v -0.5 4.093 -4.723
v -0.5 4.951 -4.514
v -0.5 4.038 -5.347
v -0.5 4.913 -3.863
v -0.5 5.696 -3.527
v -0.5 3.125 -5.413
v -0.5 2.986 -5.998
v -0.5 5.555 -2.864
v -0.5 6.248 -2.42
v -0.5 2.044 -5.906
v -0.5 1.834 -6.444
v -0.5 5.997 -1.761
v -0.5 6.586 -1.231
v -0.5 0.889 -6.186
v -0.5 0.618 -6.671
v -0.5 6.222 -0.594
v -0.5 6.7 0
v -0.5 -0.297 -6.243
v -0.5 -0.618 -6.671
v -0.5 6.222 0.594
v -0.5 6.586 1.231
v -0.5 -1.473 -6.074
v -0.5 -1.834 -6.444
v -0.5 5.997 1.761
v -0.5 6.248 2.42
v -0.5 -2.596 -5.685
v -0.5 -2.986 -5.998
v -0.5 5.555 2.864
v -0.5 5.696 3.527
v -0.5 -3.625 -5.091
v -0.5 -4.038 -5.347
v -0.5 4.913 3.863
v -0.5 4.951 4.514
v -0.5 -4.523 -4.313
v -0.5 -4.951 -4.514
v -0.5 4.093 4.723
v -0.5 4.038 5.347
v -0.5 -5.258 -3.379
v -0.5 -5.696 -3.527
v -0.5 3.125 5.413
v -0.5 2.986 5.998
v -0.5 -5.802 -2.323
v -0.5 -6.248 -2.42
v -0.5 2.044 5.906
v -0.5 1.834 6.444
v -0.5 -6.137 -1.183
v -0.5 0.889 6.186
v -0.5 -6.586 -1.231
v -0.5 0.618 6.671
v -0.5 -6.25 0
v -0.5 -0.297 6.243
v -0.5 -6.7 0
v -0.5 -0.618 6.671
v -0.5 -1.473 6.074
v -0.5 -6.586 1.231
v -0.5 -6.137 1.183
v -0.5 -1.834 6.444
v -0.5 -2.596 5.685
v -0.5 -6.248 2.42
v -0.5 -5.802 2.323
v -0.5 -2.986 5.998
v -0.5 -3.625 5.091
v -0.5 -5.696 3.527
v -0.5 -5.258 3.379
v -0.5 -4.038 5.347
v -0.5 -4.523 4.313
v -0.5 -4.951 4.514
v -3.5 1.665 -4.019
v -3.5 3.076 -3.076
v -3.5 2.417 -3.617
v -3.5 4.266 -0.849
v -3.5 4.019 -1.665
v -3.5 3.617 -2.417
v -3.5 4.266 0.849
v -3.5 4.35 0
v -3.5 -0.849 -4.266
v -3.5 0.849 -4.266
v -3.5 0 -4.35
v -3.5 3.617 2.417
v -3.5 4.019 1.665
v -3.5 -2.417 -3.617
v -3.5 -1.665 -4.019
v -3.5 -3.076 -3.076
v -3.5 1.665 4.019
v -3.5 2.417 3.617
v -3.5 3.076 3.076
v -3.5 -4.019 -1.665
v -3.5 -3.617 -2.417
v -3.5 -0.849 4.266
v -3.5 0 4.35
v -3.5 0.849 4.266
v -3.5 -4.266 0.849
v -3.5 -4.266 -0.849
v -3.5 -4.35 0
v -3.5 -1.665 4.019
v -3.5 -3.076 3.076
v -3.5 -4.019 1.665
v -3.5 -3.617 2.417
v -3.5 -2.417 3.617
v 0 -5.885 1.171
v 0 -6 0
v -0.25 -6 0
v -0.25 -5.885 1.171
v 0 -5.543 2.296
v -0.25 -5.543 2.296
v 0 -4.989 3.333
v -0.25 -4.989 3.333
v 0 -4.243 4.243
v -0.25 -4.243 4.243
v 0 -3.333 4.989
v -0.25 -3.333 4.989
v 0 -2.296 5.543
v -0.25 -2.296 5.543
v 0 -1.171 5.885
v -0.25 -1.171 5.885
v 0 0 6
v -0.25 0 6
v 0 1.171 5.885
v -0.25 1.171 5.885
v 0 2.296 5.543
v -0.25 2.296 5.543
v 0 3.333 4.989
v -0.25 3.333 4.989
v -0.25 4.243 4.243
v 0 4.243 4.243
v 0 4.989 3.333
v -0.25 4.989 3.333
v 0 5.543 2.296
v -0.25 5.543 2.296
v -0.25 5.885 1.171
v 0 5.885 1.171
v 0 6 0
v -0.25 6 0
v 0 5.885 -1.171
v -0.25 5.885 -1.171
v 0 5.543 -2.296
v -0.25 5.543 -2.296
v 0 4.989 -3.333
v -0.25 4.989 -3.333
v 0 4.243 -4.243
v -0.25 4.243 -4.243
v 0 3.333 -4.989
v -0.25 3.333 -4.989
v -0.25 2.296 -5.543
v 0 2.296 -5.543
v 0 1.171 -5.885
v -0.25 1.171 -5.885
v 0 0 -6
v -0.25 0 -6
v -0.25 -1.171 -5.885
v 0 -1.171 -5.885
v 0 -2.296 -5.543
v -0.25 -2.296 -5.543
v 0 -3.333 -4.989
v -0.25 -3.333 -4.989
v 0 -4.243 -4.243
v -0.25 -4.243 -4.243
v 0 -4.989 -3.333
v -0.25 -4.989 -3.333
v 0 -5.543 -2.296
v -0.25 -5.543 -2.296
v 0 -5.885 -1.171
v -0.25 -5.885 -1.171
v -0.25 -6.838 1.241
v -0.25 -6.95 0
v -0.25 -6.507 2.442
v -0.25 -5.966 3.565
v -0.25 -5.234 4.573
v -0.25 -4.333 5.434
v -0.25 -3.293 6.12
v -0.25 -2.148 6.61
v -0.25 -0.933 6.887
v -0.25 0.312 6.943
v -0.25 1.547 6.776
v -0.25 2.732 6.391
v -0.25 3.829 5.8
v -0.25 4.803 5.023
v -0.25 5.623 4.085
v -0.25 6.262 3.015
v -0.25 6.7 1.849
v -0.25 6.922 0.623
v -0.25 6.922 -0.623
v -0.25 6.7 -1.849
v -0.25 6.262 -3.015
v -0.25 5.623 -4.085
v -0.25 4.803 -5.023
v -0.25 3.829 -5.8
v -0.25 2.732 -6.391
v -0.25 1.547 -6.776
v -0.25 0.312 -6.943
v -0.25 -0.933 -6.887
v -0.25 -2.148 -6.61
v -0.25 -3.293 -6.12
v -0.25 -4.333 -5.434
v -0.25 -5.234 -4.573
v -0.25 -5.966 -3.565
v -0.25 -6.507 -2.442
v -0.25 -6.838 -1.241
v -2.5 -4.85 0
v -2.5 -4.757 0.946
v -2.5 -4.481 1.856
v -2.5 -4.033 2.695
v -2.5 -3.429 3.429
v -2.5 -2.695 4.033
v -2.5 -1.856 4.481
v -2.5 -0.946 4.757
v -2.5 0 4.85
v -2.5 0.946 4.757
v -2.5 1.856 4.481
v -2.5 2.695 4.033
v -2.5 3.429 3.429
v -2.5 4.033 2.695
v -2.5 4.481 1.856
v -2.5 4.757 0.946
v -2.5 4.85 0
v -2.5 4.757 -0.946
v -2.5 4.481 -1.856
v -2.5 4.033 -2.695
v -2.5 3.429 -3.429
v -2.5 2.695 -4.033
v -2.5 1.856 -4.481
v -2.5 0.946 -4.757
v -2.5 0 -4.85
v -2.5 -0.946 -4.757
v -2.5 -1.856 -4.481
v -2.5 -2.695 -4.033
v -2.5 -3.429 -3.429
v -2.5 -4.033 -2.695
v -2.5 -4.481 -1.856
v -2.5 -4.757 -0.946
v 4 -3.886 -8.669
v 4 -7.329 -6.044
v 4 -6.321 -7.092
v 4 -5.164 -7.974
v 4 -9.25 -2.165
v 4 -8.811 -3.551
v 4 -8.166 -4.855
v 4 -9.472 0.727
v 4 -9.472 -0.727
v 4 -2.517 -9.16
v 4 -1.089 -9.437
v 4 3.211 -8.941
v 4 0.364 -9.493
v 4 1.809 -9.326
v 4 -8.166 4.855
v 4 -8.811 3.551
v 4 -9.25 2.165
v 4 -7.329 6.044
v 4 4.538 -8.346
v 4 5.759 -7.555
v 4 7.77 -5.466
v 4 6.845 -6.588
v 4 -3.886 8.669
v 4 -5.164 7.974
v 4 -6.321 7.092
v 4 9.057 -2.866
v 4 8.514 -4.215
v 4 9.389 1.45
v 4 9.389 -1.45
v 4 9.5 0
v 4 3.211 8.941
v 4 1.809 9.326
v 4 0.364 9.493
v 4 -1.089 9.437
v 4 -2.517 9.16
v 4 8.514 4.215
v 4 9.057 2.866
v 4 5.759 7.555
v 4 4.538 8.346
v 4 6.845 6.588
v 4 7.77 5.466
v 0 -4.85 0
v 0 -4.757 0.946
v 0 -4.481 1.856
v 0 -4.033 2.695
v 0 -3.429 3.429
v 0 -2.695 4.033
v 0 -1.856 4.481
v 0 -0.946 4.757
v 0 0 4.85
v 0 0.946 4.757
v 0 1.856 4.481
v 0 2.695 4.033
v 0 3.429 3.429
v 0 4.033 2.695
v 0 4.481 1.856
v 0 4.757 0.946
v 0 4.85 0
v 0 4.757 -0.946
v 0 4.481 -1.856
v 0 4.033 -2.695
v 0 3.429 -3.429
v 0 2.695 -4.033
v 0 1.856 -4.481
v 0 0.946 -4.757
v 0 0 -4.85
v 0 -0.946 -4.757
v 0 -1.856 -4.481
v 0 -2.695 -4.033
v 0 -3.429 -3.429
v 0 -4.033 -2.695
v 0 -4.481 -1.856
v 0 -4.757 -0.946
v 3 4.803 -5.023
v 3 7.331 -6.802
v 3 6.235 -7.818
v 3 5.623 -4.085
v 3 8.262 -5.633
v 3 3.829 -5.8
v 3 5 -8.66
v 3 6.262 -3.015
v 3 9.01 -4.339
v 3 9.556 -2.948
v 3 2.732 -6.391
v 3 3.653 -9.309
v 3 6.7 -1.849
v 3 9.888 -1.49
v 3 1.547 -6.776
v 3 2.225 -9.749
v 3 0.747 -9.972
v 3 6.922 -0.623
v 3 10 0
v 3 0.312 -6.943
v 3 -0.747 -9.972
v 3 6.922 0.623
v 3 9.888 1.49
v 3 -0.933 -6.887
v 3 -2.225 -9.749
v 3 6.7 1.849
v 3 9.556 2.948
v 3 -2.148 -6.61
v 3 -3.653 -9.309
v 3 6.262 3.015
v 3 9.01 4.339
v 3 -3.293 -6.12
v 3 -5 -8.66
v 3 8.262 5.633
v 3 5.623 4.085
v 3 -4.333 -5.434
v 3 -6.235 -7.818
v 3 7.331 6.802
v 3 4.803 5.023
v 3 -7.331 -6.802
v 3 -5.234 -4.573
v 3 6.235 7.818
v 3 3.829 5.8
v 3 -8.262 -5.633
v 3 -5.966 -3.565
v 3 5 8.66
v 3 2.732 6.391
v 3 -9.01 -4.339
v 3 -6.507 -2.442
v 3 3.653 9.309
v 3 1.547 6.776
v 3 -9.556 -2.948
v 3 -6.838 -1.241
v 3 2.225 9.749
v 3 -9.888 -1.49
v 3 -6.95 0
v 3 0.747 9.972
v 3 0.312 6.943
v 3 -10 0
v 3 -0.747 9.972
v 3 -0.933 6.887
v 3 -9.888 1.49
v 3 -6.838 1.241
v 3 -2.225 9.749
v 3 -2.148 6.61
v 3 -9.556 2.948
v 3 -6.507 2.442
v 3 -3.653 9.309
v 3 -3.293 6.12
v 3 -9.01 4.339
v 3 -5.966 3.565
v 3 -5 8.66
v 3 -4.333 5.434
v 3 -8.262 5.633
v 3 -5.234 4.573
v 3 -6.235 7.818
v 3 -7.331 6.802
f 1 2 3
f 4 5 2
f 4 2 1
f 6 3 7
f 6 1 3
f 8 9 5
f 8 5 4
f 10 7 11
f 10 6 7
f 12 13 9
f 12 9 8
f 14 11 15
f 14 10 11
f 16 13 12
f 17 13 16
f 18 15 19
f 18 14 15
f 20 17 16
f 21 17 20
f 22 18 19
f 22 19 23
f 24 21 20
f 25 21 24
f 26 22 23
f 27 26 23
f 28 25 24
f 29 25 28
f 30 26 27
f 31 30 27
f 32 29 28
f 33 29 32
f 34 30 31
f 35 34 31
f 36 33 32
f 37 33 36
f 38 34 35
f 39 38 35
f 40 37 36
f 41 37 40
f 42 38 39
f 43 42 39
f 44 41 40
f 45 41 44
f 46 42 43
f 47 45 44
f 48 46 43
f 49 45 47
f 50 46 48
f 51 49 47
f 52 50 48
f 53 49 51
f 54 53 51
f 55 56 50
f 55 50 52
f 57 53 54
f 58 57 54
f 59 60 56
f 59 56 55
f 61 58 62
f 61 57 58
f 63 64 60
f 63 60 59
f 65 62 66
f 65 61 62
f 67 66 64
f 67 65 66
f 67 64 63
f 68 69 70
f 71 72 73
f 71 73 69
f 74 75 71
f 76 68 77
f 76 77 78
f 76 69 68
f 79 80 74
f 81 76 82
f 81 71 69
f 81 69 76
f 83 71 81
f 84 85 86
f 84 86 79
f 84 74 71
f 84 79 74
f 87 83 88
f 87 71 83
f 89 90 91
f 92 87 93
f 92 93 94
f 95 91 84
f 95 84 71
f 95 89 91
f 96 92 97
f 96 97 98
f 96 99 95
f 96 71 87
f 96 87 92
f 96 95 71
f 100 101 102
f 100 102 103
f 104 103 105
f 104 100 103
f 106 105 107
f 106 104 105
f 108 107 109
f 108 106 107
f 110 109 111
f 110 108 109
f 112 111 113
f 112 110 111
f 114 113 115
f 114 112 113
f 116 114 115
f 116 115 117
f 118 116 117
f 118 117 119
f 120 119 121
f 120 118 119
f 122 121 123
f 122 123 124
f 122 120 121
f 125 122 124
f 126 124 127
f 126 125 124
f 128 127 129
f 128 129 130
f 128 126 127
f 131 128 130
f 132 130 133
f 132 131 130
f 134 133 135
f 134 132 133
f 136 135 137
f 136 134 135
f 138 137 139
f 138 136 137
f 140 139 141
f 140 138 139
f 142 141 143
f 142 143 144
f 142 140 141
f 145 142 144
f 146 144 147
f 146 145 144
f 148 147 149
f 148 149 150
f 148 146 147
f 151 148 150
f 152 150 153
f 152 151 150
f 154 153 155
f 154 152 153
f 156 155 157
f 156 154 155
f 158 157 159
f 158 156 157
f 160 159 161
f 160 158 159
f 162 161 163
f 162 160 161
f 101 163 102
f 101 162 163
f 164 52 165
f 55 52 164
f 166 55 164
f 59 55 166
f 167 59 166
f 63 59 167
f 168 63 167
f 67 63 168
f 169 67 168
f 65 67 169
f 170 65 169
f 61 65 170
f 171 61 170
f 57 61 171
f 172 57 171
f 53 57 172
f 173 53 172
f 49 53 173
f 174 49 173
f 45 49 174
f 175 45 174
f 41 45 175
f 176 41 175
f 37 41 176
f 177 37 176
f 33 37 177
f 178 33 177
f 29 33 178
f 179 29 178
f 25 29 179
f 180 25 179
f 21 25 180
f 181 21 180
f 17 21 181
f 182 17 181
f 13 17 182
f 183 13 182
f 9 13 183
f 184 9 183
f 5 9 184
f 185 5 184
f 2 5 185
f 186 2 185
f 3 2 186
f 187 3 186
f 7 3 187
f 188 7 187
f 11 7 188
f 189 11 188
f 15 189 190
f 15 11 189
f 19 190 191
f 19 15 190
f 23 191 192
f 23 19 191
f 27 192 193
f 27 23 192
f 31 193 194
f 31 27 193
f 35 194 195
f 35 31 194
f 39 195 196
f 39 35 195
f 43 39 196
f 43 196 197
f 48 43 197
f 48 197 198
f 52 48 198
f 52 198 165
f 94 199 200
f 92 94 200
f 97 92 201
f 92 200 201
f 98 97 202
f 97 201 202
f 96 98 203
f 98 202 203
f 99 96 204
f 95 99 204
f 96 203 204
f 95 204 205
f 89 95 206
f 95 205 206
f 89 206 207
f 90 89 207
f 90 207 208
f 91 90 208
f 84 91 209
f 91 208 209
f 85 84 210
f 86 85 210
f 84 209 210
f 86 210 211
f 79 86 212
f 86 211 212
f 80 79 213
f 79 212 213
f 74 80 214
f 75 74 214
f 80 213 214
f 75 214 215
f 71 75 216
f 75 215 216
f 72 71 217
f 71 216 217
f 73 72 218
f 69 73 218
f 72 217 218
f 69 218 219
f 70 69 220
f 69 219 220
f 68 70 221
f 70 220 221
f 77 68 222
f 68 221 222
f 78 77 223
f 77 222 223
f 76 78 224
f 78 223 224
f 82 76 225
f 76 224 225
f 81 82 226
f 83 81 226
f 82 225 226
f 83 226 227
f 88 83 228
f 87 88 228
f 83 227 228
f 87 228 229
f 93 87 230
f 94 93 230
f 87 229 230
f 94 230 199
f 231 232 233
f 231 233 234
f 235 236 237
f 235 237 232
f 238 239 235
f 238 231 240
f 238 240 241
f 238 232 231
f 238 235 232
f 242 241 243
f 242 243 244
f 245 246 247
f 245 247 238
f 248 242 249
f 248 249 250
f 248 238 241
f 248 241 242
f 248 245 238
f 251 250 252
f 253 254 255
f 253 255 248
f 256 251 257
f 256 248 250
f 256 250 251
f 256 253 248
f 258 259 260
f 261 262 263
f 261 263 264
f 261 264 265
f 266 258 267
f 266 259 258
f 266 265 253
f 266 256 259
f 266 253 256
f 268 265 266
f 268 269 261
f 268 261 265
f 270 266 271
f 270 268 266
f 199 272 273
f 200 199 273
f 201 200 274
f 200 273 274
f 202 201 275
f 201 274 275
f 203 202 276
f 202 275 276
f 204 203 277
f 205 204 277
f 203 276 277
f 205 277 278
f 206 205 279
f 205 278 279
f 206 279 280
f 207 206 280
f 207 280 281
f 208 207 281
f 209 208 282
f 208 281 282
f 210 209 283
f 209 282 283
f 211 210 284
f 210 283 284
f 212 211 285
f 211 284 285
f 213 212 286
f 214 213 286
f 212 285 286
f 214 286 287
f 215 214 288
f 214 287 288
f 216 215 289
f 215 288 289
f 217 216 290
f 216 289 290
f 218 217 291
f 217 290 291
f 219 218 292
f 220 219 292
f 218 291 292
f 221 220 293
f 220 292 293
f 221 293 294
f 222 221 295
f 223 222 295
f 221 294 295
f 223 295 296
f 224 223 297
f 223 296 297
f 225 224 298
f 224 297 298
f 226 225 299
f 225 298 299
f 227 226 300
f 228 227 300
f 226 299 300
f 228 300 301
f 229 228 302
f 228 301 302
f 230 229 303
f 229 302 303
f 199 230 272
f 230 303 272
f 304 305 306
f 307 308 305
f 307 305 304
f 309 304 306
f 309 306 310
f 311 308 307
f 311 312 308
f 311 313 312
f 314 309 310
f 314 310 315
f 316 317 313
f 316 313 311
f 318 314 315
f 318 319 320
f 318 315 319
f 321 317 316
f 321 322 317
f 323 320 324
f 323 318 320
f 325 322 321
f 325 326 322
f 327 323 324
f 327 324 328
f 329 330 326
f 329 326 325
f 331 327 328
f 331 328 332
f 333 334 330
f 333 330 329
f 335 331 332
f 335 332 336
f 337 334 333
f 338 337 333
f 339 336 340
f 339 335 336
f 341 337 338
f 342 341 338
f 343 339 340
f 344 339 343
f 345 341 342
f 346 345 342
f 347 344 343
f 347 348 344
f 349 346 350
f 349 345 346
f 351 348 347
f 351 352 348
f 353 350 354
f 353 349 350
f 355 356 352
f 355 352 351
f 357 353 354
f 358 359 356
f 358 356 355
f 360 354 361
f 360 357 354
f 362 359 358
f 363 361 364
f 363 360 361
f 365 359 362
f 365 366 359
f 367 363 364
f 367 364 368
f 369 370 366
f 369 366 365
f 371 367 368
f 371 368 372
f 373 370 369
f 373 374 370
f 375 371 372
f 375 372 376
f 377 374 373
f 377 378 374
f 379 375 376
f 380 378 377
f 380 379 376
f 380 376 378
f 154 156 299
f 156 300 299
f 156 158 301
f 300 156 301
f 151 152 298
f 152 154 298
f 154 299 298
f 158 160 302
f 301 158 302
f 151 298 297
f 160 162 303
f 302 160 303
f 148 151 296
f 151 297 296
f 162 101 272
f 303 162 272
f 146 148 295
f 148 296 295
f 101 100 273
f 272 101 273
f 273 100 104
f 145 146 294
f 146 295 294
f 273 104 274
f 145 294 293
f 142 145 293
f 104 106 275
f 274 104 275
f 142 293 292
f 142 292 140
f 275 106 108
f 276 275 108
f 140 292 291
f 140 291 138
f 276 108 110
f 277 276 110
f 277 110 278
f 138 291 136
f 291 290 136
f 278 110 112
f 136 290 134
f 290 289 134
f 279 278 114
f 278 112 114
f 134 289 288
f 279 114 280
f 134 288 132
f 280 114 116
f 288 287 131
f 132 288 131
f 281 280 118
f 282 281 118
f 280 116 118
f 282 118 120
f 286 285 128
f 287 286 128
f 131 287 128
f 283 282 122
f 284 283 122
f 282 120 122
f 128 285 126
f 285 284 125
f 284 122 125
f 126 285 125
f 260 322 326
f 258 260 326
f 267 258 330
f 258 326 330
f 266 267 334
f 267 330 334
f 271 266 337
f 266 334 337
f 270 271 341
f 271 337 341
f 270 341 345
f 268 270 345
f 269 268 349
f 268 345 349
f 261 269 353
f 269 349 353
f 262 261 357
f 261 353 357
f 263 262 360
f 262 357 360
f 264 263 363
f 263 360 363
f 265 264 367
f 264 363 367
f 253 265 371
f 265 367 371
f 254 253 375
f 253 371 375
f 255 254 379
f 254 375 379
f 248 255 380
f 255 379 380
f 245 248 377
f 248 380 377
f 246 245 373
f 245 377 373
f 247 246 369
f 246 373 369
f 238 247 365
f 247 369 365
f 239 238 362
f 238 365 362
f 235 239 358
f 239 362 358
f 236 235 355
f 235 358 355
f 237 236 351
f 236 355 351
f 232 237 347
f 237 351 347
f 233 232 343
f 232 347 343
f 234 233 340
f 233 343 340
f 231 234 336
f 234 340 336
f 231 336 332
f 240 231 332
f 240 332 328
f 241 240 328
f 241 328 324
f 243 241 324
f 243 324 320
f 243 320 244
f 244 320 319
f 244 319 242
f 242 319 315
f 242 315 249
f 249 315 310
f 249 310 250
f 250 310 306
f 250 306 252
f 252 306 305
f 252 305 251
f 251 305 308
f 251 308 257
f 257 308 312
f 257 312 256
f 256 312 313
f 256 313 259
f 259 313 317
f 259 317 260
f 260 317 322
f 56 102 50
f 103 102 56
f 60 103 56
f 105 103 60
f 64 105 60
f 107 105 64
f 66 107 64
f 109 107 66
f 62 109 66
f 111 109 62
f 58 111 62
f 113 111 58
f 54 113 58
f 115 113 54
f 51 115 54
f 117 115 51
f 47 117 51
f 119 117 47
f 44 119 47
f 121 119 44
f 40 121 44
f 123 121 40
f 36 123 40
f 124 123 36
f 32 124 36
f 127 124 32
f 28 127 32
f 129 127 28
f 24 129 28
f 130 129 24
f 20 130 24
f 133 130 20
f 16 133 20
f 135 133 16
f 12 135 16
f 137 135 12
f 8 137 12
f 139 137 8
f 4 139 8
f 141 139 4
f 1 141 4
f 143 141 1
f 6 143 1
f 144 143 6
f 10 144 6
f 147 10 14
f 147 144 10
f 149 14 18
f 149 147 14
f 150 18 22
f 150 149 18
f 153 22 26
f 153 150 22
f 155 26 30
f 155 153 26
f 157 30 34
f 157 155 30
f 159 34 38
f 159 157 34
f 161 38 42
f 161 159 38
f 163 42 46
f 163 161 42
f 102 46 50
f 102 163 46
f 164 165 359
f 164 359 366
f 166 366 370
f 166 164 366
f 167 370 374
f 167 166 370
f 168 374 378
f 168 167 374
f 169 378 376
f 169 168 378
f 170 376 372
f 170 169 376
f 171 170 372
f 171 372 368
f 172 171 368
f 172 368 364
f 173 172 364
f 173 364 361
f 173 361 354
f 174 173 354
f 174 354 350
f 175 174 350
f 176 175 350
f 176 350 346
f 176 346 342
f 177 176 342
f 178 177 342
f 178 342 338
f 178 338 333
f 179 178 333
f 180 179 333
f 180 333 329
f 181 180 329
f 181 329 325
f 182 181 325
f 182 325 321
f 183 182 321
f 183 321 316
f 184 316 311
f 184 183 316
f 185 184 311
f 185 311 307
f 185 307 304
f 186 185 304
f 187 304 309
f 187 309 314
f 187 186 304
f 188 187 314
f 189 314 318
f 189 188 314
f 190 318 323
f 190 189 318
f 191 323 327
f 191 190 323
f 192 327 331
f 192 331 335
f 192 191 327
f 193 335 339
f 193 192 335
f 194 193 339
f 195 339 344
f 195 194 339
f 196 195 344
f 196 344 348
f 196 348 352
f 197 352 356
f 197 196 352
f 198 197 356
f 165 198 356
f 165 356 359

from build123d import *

# Parameters (mm, degrees)
F0_R       = 10
F1_DEPTH   = 4
F2_R       = 4.85
F3_DEPTH   = 3.5
F4_R       = 6.95
F4_R_2     = 6
F5_DEPTH   = 0.5
F6_R       = 10
F6_R_2     = 6.95
F7_DEPTH   = 3
F8_SIZE    = 0.25
F9_SIZE2   = 0.99999
F9_SIZE    = 0.49999
F9_2_SIZE2 = 1
F9_2_SIZE  = 0.5


# Not quite as in the source:
# - a fillet or chamfer is up to 0.001 mm smaller than in the source, because OpenCascade refuses the exact size


with BuildPart() as f1:
    # F0 (on Right) → F1 (new body)
    with BuildSketch(Plane.YZ):
        Circle(F0_R)
    extrude(amount=F1_DEPTH)

    # F2 (on face) → F3 (join)
    with BuildSketch(Plane(origin=(0, 0, 0), x_dir=(0, -1, 0), z_dir=(-1, 0, 0))):
        Circle(F2_R)
    extrude(amount=F3_DEPTH)

    # F4 (on face) → F5 (join)
    with BuildSketch(Plane(origin=(0, 0, 0), x_dir=(0, -1, 0), z_dir=(-1, 0, 0))):
        Circle(F4_R)
        Circle(F4_R_2, mode=Mode.SUBTRACT)
    extrude(amount=F5_DEPTH)

    # F6 (on face) → F7 (cut)
    with BuildSketch(Plane(origin=(0, 0, 0), x_dir=(0, -1, 0), z_dir=(-1, 0, 0))):
        Circle(F6_R)
        Circle(F6_R_2, mode=Mode.SUBTRACT)
    extrude(amount=-F7_DEPTH, mode=Mode.SUBTRACT)

    # F8
    f8_edges = [f1.edges().sort_by_distance(p)[0] for p in [
        (-0.5, 6.95, 0),
        (-0.5, 6, 0),
    ]]
    chamfer(f8_edges, length=F8_SIZE)

    # F9 (size 0.5 and 1 in the source; OpenCascade refuses exactly that, so slightly less here)
    f9_edges = [f1.edges().sort_by_distance(p)[0] for p in [
        (4, -10, 0),
    ]]
    f9_side = f1.faces().sort_by_distance((4, 0, 0))[0]
    chamfer(f9_edges, length=F9_SIZE, length2=F9_SIZE2, reference=f9_side)

    # F9#2
    f9_2_edges = [f1.edges().sort_by_distance(p)[0] for p in [
        (-3.5, 4.85, 0),
    ]]
    f9_2_side = f1.faces().sort_by_distance((-3.5, 0, 0))[0]
    chamfer(f9_2_edges, length=F9_2_SIZE, length2=F9_2_SIZE2, reference=f9_2_side)


solid = f1.part
